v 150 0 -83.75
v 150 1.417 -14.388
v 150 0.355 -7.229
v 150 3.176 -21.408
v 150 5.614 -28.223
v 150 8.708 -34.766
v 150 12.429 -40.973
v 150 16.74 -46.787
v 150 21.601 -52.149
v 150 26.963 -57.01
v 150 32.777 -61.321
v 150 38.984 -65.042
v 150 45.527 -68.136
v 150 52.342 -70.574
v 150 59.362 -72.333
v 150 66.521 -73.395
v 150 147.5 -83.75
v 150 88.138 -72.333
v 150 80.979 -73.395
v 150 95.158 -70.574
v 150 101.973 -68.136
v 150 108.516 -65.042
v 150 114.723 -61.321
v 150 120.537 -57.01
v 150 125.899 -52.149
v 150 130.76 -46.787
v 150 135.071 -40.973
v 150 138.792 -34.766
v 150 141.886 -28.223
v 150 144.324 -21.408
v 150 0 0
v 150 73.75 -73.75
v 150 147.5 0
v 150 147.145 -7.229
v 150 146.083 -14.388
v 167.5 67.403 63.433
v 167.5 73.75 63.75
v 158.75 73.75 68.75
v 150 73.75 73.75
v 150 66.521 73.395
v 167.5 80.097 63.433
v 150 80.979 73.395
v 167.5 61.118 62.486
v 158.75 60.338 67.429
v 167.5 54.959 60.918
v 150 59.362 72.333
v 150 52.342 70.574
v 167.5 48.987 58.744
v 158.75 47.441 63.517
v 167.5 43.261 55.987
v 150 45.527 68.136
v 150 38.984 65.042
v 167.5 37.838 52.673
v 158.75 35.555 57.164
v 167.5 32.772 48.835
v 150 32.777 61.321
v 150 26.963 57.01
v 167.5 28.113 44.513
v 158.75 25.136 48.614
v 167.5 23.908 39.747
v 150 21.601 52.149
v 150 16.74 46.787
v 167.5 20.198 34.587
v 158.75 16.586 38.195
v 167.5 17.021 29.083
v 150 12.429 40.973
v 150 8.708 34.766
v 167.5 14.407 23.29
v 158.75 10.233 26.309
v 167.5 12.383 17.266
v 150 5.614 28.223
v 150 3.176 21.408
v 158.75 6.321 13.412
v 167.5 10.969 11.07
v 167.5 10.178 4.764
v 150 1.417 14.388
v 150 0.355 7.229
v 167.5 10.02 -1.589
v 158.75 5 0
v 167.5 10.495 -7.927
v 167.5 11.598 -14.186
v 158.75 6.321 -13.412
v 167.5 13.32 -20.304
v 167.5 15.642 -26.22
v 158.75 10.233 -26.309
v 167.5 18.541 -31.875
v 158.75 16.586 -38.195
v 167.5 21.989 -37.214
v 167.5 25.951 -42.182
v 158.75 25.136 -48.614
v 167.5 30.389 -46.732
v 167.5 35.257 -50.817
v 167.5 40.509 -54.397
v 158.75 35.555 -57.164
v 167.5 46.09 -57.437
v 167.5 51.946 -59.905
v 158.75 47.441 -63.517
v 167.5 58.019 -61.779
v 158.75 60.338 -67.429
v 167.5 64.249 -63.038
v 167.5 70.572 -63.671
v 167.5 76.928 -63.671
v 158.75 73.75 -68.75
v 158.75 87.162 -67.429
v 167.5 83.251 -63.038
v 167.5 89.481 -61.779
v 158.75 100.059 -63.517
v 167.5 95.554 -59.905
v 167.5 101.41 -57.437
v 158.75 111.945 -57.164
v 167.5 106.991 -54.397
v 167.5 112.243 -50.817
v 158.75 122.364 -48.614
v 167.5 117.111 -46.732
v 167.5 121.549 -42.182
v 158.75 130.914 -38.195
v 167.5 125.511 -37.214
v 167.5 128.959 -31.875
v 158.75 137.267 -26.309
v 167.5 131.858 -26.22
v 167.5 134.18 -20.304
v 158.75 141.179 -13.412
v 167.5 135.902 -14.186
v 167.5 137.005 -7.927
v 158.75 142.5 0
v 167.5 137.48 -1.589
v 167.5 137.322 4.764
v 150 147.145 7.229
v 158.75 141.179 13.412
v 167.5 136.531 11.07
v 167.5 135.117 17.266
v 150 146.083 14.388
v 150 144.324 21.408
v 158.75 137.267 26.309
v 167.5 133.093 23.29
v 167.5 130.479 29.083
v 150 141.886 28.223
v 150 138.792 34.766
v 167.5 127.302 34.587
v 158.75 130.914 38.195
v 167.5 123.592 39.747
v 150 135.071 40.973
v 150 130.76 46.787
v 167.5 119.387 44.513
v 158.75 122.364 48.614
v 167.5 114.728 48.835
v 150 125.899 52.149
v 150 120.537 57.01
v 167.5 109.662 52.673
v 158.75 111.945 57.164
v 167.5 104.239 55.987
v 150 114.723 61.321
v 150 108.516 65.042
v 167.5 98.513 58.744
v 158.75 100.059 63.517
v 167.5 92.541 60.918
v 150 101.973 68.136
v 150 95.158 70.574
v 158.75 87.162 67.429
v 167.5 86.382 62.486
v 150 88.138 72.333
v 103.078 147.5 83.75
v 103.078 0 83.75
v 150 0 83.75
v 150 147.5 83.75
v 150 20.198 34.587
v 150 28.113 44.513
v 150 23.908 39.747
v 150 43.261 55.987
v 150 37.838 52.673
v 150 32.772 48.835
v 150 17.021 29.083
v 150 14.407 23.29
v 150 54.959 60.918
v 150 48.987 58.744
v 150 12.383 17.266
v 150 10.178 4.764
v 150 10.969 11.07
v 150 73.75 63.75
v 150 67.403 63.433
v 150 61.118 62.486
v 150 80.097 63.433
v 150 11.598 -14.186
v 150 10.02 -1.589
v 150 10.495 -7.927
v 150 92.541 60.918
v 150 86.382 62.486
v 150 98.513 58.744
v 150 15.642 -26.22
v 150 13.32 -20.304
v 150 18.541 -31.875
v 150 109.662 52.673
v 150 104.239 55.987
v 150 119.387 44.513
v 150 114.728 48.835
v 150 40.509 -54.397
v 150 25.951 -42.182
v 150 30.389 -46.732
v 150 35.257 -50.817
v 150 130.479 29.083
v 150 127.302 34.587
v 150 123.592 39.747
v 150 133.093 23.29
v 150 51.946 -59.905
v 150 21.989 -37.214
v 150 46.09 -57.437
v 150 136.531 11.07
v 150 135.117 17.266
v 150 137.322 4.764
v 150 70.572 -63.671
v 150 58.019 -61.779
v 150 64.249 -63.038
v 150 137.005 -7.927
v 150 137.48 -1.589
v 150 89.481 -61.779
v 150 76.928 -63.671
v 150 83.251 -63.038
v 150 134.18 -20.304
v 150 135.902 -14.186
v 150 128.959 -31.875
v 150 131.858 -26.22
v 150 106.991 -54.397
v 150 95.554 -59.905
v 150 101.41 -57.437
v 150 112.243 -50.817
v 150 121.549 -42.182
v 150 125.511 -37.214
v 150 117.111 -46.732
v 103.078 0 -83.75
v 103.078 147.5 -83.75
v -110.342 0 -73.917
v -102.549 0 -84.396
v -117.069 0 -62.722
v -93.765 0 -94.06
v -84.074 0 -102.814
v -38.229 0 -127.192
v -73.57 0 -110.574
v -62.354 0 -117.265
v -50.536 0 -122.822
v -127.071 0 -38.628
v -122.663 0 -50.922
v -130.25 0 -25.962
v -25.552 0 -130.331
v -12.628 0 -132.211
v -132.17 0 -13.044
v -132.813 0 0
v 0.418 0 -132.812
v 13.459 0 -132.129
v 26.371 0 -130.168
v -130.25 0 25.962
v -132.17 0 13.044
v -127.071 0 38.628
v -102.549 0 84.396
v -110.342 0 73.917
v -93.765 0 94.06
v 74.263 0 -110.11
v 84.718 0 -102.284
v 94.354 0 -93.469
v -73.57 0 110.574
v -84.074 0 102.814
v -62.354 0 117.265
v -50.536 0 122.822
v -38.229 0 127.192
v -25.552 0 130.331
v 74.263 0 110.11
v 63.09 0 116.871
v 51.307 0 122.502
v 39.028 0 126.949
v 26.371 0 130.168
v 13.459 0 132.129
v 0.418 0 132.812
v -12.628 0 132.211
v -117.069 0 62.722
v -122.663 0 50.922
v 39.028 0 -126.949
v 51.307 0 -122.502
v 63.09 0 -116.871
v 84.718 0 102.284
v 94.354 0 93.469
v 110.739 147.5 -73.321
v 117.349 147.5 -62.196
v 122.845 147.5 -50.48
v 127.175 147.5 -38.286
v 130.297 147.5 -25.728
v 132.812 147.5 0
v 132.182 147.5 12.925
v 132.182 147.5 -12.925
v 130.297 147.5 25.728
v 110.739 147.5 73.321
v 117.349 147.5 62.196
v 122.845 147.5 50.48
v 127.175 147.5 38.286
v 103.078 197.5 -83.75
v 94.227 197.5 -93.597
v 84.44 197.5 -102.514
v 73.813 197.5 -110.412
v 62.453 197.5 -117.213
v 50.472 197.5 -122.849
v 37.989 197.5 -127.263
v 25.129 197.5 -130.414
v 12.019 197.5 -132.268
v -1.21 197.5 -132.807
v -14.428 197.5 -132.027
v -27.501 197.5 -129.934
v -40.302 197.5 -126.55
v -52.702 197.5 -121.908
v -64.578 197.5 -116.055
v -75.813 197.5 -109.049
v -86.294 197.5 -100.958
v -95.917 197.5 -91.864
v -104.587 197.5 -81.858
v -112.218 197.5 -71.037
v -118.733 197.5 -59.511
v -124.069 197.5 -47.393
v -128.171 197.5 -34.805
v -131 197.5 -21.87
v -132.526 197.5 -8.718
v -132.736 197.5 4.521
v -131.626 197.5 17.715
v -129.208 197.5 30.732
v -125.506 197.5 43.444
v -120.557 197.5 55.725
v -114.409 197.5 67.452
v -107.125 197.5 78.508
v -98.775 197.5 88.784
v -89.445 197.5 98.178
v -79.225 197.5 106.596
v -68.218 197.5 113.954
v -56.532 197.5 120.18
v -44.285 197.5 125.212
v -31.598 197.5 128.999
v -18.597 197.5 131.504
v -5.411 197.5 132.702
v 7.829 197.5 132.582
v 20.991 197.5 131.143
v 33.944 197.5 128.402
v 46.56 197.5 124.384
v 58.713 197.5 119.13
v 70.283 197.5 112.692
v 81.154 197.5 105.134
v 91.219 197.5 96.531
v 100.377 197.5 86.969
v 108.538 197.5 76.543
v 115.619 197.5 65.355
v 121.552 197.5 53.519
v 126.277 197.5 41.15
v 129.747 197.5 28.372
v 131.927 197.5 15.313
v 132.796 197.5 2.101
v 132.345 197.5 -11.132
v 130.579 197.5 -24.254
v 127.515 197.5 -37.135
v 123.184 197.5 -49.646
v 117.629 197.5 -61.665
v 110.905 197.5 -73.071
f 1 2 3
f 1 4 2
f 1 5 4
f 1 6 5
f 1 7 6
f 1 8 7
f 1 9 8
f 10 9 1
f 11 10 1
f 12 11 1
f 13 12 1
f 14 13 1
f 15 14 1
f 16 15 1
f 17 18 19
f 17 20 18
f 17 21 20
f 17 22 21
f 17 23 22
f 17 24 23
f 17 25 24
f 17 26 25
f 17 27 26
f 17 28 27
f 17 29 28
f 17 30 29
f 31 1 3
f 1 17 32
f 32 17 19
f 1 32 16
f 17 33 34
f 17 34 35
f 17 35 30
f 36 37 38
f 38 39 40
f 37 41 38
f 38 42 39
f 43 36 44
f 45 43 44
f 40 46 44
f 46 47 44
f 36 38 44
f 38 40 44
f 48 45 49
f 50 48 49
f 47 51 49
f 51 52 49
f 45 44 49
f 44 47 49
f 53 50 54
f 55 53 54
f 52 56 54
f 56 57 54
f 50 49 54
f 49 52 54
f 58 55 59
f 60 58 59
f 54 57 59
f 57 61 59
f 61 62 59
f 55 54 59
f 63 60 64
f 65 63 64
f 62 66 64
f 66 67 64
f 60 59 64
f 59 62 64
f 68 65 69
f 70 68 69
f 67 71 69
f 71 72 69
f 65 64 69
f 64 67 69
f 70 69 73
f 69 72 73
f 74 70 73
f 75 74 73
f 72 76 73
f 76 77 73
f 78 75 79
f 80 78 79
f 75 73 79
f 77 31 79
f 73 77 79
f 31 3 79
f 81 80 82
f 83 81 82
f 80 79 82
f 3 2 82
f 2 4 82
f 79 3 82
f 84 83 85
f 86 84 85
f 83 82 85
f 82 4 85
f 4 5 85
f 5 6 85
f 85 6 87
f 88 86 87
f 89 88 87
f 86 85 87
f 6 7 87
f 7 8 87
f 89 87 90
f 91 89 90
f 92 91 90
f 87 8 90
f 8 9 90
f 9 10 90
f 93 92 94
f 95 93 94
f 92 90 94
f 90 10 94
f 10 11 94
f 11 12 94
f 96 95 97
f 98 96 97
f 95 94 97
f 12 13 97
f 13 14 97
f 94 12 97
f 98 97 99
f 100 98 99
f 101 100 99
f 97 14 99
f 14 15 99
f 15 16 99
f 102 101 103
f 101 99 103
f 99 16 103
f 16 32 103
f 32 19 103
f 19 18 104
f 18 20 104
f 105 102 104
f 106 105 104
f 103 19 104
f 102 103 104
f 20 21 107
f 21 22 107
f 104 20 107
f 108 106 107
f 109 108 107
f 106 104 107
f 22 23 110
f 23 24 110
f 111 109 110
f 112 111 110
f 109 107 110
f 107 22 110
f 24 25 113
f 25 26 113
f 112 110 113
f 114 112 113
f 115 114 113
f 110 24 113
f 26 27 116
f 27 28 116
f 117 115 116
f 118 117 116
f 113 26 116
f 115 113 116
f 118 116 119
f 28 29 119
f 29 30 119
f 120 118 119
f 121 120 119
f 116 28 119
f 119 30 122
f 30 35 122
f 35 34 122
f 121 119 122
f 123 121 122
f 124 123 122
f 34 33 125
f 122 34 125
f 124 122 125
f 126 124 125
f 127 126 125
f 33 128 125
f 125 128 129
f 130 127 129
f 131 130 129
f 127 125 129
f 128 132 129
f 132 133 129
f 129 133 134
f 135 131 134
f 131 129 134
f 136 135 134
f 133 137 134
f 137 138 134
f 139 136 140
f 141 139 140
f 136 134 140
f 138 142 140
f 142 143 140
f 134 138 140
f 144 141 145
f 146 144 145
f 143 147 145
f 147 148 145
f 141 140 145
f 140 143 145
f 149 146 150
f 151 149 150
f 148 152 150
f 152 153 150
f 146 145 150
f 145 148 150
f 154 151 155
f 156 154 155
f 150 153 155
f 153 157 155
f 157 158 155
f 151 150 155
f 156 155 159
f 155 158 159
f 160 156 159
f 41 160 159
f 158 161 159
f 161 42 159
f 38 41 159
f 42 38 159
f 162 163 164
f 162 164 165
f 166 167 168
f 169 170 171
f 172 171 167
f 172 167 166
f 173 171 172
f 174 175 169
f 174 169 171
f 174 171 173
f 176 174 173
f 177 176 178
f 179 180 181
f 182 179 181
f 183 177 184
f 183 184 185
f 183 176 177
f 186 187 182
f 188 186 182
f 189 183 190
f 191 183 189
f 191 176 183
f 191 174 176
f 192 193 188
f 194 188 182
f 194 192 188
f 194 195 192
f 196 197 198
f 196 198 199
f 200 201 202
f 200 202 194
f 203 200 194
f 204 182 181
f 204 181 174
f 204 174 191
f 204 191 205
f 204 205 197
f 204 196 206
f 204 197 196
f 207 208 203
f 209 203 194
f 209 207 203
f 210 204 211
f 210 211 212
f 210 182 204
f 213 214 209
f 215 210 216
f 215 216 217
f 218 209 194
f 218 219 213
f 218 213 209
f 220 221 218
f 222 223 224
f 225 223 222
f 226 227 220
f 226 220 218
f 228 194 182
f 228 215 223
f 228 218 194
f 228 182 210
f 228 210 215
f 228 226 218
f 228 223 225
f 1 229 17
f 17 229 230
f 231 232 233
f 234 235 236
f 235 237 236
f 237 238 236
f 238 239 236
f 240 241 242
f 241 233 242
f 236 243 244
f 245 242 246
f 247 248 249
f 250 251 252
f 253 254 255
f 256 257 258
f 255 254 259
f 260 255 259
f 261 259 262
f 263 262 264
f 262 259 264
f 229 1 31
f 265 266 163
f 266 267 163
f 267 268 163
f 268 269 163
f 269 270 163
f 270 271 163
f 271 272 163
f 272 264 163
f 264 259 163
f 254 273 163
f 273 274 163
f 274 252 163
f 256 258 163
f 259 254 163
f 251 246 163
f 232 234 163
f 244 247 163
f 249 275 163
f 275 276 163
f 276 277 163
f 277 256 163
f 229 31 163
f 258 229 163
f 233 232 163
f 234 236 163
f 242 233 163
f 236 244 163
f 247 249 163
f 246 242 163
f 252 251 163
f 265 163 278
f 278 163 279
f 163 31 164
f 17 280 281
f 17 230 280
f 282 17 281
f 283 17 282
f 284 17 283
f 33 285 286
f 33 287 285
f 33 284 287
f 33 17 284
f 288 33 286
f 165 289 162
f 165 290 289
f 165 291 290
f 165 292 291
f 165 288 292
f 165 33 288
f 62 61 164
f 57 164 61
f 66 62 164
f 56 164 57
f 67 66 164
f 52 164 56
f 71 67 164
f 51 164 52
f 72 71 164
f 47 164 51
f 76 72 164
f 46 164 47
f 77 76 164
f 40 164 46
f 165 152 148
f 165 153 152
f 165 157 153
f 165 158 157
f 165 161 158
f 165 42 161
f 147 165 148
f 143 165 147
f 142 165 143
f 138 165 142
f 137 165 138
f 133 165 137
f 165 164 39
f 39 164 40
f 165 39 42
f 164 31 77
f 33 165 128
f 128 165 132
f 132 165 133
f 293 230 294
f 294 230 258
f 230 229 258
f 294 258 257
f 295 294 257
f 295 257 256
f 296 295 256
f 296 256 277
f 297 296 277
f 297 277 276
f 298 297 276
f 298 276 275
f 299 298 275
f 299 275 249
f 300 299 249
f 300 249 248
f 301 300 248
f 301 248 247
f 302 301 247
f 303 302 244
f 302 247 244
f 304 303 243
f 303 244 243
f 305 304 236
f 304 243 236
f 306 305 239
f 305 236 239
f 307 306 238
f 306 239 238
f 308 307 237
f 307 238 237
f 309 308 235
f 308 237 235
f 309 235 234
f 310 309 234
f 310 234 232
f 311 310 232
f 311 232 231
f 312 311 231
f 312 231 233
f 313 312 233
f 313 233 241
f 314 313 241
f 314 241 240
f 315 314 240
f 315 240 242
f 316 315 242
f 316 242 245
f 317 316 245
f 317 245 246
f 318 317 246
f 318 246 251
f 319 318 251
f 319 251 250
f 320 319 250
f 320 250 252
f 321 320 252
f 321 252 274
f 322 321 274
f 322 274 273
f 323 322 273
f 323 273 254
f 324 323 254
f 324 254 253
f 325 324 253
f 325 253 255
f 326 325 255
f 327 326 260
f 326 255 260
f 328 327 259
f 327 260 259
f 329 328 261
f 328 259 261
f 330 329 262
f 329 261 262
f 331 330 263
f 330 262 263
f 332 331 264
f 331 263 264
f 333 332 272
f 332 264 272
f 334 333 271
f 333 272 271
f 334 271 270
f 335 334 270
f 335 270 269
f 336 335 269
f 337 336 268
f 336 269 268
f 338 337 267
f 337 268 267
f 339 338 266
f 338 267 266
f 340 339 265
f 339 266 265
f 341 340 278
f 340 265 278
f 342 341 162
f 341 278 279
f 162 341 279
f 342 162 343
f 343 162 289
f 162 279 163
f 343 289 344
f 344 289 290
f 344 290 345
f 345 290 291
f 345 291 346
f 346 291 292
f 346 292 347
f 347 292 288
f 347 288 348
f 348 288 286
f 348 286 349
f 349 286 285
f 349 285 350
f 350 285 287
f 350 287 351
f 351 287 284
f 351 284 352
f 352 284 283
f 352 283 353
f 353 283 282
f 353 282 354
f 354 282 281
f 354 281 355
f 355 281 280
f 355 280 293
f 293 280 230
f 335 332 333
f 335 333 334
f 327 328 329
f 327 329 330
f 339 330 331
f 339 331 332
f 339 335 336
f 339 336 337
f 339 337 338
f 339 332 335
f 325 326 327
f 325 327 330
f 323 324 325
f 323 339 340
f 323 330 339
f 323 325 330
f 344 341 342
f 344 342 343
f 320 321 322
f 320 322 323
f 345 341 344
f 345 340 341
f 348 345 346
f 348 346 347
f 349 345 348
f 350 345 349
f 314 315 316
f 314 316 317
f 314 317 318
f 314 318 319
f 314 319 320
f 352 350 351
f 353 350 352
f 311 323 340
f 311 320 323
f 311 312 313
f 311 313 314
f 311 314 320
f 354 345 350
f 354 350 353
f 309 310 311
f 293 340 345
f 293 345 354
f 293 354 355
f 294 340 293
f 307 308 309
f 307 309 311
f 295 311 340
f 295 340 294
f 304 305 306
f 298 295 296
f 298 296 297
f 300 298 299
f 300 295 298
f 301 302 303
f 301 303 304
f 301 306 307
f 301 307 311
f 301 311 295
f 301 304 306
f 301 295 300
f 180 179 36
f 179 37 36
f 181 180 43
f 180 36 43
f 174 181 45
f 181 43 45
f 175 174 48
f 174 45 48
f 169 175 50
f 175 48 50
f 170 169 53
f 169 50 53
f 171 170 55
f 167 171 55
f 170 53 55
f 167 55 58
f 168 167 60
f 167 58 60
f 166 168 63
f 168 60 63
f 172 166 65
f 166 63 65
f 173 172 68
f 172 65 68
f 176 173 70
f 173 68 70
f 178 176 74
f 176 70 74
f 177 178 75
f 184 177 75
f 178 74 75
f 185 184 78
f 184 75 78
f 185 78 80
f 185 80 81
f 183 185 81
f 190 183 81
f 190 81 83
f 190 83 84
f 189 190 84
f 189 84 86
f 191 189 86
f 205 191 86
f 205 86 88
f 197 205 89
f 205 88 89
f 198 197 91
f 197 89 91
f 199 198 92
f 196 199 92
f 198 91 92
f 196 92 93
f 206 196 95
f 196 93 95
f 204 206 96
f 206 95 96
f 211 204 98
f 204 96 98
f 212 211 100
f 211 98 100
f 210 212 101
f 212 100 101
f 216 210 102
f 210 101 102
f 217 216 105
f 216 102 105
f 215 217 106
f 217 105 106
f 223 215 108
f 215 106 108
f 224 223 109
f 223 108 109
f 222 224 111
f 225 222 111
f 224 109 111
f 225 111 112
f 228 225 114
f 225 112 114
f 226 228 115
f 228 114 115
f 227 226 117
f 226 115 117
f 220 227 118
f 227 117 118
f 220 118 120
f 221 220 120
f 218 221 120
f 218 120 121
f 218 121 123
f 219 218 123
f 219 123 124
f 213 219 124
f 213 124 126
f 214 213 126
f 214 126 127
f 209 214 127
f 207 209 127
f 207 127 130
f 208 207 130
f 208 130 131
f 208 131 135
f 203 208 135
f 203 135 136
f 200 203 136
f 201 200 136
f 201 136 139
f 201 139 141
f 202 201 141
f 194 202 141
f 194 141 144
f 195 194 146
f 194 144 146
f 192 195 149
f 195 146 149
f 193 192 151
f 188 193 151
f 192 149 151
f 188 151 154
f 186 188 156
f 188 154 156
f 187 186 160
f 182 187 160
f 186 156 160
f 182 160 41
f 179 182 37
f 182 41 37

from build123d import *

# Parameters (mm, degrees)
SKETCH1_R           = 132.8125
BOSS_EXTRUDE1_DEPTH = 147.5
SKETCH2_W           = 167.5
SKETCH2_H           = 147.5
BOSS_EXTRUDE2_DEPTH = 150
SKETCH5_R           = 132.8125
BOSS_EXTRUDE3_DEPTH = 50


with BuildPart() as part:
    # Sketch1 → Boss-Extrude1 (new body)
    with BuildSketch(Plane(origin=(0, 0, 0), x_dir=(1, 0, 0), z_dir=(0, 1, 0))):
        with Locations(Location((0, 0, 0), (0, 0, 270))):
            Circle(SKETCH1_R)
    extrude(amount=BOSS_EXTRUDE1_DEPTH)

    # Sketch2 → Boss-Extrude2 (add)
    with BuildSketch(Plane(origin=(0, 0, 0), x_dir=(0, 0, -1), z_dir=(1, 0, 0))):
        with Locations((0, 73.75)):
            Rectangle(SKETCH2_W, SKETCH2_H)
    extrude(amount=BOSS_EXTRUDE2_DEPTH)

    # Sketch4 → Revolve1 (revolve)
    with BuildSketch(Plane.XY, mode=Mode.PRIVATE) as revolve1_sk:
        Polygon((150, 0), (150, 10), (167.5, 10), align=None)
    revolve(revolve1_sk.sketch.rotate(Axis((150, 73.75, 0), (1, 0, 0)), 270), axis=Axis((150, 73.75, 0), (1, 0, 0)))

    # Sketch5 → Boss-Extrude3 (add)
    with BuildSketch(Plane(origin=(0, 147.5, 0), x_dir=(1, 0, 0), z_dir=(0, 1, 0))):
        with Locations(Location((0, 0, 0), (0, 0, 39.093534815))):
            Circle(SKETCH5_R)
    extrude(amount=BOSS_EXTRUDE3_DEPTH)


solid = part.part
